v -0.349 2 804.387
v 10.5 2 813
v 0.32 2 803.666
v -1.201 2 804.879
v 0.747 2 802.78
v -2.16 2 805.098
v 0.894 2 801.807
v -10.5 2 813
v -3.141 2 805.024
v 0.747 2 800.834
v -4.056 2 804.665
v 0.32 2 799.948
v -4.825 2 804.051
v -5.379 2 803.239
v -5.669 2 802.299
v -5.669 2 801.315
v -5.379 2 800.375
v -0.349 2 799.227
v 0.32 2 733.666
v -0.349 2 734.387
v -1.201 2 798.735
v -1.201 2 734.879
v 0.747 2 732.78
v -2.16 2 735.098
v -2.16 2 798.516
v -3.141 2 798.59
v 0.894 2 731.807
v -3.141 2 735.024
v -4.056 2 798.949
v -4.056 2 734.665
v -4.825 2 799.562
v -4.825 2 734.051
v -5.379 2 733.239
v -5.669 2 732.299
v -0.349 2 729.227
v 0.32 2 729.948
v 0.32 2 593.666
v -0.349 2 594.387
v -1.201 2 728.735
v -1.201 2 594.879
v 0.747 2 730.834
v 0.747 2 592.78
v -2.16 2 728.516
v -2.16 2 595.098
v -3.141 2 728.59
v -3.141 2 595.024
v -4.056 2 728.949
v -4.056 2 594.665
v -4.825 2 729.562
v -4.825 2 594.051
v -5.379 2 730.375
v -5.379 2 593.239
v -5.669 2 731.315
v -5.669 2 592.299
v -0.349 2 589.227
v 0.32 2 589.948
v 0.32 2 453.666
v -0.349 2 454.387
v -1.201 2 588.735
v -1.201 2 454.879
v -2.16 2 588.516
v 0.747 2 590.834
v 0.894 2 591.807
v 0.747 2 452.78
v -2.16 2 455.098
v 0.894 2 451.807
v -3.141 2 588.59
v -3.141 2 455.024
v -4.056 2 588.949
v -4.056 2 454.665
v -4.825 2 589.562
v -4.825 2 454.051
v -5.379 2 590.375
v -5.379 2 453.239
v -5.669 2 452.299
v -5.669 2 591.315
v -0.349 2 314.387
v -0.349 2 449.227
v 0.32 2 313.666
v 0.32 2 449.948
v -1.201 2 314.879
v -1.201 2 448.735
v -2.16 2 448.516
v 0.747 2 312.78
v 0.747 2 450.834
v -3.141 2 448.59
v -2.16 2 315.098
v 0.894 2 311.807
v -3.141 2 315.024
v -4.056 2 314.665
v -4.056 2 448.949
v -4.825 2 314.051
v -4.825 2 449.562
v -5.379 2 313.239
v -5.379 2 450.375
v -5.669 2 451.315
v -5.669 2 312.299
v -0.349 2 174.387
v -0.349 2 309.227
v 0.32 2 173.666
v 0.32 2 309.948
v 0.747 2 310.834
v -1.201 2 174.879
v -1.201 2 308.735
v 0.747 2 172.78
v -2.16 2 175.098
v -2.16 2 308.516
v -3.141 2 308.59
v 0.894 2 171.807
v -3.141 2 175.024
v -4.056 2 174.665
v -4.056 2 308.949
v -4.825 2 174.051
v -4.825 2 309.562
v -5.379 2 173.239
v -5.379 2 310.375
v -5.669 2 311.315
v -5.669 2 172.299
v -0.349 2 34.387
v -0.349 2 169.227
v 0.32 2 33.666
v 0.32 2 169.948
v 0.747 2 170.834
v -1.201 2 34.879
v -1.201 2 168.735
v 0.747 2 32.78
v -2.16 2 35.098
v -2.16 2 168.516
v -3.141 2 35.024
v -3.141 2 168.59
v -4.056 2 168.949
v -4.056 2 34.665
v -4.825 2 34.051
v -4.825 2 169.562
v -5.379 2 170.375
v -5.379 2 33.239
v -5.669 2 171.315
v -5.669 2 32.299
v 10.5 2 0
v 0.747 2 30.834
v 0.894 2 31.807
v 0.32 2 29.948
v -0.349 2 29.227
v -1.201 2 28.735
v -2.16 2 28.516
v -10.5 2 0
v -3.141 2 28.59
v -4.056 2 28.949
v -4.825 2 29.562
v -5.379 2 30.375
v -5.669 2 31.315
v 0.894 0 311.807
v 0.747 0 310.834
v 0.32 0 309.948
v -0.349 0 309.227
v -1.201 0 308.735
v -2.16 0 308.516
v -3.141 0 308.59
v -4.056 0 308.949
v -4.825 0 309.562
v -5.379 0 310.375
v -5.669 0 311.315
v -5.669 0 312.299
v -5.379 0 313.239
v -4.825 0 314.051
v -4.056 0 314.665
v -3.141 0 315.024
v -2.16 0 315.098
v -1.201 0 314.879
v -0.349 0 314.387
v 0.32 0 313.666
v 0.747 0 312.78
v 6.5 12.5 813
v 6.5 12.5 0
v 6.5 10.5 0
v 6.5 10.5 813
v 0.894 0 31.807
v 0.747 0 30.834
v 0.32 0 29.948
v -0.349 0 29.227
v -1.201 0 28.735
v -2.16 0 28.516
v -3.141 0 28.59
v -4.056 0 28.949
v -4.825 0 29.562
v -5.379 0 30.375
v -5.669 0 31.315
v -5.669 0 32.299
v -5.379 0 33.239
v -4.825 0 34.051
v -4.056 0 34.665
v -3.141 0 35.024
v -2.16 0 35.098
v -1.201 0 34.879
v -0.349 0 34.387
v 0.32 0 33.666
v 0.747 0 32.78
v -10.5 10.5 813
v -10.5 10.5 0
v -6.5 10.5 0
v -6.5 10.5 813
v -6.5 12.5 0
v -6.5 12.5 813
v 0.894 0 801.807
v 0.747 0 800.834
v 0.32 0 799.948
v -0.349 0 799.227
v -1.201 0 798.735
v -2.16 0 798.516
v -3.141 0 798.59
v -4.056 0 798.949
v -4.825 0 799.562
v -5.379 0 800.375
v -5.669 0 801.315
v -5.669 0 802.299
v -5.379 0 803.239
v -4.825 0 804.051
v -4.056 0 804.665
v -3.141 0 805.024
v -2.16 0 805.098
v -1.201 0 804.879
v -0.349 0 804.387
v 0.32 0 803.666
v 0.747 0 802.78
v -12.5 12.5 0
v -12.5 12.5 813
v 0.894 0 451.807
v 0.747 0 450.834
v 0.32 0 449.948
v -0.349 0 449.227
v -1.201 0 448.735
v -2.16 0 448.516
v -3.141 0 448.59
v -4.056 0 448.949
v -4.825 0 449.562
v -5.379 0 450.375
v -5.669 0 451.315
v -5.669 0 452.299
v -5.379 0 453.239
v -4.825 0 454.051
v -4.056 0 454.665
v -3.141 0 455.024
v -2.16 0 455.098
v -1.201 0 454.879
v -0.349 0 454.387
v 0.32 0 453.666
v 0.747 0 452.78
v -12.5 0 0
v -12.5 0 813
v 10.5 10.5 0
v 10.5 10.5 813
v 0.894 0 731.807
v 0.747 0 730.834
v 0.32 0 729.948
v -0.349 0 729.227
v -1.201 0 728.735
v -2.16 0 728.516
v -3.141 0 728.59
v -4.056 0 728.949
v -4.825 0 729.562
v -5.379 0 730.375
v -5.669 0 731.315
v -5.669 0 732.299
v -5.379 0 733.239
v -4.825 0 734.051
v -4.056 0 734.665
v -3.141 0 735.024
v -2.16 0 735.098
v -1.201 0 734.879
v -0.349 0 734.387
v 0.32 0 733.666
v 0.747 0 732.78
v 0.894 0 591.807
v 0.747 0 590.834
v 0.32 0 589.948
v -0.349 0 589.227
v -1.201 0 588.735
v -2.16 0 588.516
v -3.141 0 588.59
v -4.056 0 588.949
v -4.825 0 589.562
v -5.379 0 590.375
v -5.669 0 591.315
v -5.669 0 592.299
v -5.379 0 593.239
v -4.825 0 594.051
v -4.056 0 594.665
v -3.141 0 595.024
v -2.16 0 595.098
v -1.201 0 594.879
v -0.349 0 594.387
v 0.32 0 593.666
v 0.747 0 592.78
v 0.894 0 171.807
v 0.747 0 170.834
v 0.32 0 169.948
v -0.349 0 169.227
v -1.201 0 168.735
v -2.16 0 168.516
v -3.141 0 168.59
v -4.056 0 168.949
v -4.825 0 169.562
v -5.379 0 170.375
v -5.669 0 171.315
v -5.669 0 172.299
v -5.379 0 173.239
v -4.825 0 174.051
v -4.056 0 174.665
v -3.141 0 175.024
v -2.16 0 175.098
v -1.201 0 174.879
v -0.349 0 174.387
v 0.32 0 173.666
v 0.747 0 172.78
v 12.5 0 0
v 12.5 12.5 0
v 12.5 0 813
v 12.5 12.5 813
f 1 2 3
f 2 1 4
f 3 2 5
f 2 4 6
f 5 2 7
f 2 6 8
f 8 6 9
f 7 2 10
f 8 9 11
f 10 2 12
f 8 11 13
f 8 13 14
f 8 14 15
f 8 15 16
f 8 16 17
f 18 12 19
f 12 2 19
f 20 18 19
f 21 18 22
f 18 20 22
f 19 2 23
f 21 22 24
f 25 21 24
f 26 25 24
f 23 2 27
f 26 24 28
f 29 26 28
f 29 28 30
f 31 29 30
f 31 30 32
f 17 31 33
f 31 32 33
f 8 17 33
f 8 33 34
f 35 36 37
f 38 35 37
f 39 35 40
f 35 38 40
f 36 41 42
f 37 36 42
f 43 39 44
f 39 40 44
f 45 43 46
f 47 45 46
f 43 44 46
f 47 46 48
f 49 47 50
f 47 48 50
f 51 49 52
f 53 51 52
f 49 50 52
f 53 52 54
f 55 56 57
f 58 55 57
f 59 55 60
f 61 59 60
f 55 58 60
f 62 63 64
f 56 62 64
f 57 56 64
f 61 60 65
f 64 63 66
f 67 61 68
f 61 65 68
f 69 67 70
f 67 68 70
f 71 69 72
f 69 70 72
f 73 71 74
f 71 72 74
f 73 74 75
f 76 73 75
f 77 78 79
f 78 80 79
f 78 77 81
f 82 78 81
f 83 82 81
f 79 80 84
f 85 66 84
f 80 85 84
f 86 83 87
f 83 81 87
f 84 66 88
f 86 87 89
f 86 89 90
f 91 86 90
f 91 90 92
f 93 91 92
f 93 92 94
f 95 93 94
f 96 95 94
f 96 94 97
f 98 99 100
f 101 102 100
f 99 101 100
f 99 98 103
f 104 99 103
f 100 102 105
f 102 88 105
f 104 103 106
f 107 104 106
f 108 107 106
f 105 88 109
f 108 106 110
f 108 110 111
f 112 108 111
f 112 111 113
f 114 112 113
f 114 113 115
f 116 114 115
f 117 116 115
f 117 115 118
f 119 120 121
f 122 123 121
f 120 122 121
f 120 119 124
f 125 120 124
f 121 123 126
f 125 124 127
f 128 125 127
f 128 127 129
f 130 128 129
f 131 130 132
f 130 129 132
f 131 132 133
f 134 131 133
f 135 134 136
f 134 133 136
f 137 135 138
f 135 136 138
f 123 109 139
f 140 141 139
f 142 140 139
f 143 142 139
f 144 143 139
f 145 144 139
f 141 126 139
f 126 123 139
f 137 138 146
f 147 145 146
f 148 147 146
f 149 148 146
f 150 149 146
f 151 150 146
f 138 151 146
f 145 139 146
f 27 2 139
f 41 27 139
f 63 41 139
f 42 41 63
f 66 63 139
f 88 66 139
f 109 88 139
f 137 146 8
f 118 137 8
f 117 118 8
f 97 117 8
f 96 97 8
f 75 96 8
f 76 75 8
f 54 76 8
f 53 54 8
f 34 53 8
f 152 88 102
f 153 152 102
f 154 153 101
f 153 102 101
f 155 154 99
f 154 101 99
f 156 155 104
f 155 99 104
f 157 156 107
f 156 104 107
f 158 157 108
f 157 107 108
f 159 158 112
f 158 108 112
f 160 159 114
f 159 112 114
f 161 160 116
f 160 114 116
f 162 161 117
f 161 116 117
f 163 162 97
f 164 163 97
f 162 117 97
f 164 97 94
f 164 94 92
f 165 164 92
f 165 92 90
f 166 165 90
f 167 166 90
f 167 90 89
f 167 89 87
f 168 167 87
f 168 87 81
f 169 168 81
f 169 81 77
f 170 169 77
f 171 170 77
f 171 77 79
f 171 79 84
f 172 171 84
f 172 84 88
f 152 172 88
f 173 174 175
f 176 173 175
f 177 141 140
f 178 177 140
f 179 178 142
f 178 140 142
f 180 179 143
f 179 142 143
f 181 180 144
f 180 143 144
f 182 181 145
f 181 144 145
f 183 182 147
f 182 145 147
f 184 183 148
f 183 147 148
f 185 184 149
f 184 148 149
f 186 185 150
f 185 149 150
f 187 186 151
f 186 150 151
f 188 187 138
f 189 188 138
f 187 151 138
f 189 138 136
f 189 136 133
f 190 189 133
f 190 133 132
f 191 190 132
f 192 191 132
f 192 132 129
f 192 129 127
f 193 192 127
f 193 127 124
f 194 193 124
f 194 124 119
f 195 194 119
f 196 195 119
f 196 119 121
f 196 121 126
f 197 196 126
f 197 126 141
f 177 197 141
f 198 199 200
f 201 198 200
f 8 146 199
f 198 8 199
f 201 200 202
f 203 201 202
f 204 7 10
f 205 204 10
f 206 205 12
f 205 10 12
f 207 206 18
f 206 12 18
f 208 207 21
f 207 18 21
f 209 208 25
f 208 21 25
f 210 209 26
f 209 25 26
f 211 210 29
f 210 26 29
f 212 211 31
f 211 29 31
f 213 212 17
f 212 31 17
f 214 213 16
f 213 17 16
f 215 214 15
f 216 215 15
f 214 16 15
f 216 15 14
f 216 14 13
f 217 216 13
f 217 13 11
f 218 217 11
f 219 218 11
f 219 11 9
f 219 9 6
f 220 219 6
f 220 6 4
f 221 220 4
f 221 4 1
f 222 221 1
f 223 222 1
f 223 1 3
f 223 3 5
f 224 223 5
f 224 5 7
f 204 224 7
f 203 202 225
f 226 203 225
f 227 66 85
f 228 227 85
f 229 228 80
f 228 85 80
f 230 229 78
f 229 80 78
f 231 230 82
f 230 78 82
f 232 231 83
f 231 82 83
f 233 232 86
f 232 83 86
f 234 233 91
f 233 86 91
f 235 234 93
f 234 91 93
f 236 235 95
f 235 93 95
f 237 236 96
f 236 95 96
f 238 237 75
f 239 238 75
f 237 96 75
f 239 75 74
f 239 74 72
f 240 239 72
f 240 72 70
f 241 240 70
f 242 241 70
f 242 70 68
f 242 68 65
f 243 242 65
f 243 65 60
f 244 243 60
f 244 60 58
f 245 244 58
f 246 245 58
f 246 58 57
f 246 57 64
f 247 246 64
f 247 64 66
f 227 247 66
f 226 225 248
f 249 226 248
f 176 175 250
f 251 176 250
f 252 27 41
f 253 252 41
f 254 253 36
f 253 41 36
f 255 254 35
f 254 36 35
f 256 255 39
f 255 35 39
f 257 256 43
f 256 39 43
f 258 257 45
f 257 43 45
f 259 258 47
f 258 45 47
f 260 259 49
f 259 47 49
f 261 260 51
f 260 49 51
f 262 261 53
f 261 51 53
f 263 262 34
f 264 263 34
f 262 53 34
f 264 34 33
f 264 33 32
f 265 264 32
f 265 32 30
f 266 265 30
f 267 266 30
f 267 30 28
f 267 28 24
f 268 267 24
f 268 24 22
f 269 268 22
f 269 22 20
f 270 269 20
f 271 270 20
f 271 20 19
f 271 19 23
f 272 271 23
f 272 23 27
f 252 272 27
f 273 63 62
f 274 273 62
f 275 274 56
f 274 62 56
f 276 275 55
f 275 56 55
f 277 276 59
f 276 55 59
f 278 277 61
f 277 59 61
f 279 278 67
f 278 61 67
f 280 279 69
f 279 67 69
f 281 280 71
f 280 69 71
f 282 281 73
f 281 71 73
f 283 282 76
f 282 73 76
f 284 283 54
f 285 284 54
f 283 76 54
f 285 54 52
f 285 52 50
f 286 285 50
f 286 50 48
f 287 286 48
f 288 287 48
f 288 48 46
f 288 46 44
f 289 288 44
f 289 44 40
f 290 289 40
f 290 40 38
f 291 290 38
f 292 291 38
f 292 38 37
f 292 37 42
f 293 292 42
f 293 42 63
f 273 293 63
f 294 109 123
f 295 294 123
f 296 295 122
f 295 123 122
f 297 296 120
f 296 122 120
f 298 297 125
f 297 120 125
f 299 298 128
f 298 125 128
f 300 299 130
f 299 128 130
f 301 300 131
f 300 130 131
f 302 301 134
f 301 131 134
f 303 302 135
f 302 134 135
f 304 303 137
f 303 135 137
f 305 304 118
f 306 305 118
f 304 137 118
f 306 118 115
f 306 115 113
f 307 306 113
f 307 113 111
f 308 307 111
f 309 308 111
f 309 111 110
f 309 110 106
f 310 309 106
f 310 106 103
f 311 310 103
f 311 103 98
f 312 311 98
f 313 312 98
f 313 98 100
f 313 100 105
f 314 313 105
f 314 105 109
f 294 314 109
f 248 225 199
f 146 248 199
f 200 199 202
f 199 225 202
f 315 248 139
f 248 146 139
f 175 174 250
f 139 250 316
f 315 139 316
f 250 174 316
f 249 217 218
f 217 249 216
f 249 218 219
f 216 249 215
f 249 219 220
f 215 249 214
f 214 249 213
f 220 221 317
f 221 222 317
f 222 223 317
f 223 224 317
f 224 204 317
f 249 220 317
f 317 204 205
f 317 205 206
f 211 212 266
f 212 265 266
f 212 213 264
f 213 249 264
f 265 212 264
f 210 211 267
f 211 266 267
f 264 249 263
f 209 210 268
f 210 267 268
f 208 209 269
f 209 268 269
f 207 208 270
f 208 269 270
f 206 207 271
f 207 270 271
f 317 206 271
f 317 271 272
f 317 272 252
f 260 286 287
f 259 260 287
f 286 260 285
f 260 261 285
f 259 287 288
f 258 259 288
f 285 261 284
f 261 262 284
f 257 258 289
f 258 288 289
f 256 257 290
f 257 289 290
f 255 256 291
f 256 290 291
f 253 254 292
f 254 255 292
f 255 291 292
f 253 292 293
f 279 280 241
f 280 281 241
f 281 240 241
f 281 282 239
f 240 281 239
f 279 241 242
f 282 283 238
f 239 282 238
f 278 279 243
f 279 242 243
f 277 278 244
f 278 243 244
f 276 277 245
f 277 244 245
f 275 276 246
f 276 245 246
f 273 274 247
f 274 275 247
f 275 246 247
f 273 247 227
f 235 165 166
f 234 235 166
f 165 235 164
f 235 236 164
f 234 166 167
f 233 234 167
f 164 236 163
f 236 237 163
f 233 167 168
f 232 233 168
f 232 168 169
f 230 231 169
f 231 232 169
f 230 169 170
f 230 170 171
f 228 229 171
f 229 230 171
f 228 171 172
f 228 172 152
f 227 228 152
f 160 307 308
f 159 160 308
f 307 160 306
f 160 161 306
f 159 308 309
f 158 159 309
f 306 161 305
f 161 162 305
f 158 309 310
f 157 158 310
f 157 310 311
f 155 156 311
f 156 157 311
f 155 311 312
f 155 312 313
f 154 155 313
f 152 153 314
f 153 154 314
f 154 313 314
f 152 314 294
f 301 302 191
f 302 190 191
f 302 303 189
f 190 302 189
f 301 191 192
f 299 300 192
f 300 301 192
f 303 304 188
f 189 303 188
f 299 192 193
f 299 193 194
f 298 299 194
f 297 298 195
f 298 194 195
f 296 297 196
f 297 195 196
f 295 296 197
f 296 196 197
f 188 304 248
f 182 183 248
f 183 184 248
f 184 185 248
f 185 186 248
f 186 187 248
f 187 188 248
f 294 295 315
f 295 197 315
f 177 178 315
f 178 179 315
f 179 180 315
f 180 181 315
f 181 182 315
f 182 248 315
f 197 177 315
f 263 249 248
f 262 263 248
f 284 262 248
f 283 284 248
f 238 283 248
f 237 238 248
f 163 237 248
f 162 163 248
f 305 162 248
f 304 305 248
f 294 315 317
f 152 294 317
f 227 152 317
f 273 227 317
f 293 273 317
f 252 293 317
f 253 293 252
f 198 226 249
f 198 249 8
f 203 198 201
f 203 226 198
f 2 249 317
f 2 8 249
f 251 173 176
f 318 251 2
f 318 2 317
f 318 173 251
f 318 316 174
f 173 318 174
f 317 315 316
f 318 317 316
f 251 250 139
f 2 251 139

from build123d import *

# Parameters (mm, degrees)
BOSS_EXTRU_1_DEPTH         = 813
D_GAGEMENT_M61_D           = 6.6
R_P_TITION_LIN_AIRE1_COUNT = 12
R_P_TITION_LIN_AIRE1_PITCH = 70


with BuildPart() as part:
    # Esquisse1 → Boss.-Extru.1 (new body)
    with BuildSketch(Plane.XY):
        Polygon((-6.5, 12.5), (-12.5, 12.5), (-12.5, 0), (12.5, 0), (12.5, 12.5), (6.5, 12.5), (6.5, 10.5), (10.5, 10.5), (10.5, 2), (-10.5, 2), (-10.5, 10.5), (-6.5, 10.5), align=None)
    extrude(amount=BOSS_EXTRU_1_DEPTH)

    # Dégagement M61 (through all)
    with Locations(Plane(origin=(0, 0, 0), x_dir=(-1, 0, 0), z_dir=(0, -1, 0))):
        with Locations((2.40627347, -801.806864395)):
            d_gagement_m61 = Hole(D_GAGEMENT_M61_D / 2)

    # Répétition linéaire1: Dégagement M61 ×12, 5 skipped
    with Locations(*[(0, 0, -i * R_P_TITION_LIN_AIRE1_PITCH) for i in range(1, R_P_TITION_LIN_AIRE1_COUNT) if i not in (2, 4, 6, 8, 10)]):
        add(d_gagement_m61, mode=Mode.SUBTRACT)


solid = part.part
